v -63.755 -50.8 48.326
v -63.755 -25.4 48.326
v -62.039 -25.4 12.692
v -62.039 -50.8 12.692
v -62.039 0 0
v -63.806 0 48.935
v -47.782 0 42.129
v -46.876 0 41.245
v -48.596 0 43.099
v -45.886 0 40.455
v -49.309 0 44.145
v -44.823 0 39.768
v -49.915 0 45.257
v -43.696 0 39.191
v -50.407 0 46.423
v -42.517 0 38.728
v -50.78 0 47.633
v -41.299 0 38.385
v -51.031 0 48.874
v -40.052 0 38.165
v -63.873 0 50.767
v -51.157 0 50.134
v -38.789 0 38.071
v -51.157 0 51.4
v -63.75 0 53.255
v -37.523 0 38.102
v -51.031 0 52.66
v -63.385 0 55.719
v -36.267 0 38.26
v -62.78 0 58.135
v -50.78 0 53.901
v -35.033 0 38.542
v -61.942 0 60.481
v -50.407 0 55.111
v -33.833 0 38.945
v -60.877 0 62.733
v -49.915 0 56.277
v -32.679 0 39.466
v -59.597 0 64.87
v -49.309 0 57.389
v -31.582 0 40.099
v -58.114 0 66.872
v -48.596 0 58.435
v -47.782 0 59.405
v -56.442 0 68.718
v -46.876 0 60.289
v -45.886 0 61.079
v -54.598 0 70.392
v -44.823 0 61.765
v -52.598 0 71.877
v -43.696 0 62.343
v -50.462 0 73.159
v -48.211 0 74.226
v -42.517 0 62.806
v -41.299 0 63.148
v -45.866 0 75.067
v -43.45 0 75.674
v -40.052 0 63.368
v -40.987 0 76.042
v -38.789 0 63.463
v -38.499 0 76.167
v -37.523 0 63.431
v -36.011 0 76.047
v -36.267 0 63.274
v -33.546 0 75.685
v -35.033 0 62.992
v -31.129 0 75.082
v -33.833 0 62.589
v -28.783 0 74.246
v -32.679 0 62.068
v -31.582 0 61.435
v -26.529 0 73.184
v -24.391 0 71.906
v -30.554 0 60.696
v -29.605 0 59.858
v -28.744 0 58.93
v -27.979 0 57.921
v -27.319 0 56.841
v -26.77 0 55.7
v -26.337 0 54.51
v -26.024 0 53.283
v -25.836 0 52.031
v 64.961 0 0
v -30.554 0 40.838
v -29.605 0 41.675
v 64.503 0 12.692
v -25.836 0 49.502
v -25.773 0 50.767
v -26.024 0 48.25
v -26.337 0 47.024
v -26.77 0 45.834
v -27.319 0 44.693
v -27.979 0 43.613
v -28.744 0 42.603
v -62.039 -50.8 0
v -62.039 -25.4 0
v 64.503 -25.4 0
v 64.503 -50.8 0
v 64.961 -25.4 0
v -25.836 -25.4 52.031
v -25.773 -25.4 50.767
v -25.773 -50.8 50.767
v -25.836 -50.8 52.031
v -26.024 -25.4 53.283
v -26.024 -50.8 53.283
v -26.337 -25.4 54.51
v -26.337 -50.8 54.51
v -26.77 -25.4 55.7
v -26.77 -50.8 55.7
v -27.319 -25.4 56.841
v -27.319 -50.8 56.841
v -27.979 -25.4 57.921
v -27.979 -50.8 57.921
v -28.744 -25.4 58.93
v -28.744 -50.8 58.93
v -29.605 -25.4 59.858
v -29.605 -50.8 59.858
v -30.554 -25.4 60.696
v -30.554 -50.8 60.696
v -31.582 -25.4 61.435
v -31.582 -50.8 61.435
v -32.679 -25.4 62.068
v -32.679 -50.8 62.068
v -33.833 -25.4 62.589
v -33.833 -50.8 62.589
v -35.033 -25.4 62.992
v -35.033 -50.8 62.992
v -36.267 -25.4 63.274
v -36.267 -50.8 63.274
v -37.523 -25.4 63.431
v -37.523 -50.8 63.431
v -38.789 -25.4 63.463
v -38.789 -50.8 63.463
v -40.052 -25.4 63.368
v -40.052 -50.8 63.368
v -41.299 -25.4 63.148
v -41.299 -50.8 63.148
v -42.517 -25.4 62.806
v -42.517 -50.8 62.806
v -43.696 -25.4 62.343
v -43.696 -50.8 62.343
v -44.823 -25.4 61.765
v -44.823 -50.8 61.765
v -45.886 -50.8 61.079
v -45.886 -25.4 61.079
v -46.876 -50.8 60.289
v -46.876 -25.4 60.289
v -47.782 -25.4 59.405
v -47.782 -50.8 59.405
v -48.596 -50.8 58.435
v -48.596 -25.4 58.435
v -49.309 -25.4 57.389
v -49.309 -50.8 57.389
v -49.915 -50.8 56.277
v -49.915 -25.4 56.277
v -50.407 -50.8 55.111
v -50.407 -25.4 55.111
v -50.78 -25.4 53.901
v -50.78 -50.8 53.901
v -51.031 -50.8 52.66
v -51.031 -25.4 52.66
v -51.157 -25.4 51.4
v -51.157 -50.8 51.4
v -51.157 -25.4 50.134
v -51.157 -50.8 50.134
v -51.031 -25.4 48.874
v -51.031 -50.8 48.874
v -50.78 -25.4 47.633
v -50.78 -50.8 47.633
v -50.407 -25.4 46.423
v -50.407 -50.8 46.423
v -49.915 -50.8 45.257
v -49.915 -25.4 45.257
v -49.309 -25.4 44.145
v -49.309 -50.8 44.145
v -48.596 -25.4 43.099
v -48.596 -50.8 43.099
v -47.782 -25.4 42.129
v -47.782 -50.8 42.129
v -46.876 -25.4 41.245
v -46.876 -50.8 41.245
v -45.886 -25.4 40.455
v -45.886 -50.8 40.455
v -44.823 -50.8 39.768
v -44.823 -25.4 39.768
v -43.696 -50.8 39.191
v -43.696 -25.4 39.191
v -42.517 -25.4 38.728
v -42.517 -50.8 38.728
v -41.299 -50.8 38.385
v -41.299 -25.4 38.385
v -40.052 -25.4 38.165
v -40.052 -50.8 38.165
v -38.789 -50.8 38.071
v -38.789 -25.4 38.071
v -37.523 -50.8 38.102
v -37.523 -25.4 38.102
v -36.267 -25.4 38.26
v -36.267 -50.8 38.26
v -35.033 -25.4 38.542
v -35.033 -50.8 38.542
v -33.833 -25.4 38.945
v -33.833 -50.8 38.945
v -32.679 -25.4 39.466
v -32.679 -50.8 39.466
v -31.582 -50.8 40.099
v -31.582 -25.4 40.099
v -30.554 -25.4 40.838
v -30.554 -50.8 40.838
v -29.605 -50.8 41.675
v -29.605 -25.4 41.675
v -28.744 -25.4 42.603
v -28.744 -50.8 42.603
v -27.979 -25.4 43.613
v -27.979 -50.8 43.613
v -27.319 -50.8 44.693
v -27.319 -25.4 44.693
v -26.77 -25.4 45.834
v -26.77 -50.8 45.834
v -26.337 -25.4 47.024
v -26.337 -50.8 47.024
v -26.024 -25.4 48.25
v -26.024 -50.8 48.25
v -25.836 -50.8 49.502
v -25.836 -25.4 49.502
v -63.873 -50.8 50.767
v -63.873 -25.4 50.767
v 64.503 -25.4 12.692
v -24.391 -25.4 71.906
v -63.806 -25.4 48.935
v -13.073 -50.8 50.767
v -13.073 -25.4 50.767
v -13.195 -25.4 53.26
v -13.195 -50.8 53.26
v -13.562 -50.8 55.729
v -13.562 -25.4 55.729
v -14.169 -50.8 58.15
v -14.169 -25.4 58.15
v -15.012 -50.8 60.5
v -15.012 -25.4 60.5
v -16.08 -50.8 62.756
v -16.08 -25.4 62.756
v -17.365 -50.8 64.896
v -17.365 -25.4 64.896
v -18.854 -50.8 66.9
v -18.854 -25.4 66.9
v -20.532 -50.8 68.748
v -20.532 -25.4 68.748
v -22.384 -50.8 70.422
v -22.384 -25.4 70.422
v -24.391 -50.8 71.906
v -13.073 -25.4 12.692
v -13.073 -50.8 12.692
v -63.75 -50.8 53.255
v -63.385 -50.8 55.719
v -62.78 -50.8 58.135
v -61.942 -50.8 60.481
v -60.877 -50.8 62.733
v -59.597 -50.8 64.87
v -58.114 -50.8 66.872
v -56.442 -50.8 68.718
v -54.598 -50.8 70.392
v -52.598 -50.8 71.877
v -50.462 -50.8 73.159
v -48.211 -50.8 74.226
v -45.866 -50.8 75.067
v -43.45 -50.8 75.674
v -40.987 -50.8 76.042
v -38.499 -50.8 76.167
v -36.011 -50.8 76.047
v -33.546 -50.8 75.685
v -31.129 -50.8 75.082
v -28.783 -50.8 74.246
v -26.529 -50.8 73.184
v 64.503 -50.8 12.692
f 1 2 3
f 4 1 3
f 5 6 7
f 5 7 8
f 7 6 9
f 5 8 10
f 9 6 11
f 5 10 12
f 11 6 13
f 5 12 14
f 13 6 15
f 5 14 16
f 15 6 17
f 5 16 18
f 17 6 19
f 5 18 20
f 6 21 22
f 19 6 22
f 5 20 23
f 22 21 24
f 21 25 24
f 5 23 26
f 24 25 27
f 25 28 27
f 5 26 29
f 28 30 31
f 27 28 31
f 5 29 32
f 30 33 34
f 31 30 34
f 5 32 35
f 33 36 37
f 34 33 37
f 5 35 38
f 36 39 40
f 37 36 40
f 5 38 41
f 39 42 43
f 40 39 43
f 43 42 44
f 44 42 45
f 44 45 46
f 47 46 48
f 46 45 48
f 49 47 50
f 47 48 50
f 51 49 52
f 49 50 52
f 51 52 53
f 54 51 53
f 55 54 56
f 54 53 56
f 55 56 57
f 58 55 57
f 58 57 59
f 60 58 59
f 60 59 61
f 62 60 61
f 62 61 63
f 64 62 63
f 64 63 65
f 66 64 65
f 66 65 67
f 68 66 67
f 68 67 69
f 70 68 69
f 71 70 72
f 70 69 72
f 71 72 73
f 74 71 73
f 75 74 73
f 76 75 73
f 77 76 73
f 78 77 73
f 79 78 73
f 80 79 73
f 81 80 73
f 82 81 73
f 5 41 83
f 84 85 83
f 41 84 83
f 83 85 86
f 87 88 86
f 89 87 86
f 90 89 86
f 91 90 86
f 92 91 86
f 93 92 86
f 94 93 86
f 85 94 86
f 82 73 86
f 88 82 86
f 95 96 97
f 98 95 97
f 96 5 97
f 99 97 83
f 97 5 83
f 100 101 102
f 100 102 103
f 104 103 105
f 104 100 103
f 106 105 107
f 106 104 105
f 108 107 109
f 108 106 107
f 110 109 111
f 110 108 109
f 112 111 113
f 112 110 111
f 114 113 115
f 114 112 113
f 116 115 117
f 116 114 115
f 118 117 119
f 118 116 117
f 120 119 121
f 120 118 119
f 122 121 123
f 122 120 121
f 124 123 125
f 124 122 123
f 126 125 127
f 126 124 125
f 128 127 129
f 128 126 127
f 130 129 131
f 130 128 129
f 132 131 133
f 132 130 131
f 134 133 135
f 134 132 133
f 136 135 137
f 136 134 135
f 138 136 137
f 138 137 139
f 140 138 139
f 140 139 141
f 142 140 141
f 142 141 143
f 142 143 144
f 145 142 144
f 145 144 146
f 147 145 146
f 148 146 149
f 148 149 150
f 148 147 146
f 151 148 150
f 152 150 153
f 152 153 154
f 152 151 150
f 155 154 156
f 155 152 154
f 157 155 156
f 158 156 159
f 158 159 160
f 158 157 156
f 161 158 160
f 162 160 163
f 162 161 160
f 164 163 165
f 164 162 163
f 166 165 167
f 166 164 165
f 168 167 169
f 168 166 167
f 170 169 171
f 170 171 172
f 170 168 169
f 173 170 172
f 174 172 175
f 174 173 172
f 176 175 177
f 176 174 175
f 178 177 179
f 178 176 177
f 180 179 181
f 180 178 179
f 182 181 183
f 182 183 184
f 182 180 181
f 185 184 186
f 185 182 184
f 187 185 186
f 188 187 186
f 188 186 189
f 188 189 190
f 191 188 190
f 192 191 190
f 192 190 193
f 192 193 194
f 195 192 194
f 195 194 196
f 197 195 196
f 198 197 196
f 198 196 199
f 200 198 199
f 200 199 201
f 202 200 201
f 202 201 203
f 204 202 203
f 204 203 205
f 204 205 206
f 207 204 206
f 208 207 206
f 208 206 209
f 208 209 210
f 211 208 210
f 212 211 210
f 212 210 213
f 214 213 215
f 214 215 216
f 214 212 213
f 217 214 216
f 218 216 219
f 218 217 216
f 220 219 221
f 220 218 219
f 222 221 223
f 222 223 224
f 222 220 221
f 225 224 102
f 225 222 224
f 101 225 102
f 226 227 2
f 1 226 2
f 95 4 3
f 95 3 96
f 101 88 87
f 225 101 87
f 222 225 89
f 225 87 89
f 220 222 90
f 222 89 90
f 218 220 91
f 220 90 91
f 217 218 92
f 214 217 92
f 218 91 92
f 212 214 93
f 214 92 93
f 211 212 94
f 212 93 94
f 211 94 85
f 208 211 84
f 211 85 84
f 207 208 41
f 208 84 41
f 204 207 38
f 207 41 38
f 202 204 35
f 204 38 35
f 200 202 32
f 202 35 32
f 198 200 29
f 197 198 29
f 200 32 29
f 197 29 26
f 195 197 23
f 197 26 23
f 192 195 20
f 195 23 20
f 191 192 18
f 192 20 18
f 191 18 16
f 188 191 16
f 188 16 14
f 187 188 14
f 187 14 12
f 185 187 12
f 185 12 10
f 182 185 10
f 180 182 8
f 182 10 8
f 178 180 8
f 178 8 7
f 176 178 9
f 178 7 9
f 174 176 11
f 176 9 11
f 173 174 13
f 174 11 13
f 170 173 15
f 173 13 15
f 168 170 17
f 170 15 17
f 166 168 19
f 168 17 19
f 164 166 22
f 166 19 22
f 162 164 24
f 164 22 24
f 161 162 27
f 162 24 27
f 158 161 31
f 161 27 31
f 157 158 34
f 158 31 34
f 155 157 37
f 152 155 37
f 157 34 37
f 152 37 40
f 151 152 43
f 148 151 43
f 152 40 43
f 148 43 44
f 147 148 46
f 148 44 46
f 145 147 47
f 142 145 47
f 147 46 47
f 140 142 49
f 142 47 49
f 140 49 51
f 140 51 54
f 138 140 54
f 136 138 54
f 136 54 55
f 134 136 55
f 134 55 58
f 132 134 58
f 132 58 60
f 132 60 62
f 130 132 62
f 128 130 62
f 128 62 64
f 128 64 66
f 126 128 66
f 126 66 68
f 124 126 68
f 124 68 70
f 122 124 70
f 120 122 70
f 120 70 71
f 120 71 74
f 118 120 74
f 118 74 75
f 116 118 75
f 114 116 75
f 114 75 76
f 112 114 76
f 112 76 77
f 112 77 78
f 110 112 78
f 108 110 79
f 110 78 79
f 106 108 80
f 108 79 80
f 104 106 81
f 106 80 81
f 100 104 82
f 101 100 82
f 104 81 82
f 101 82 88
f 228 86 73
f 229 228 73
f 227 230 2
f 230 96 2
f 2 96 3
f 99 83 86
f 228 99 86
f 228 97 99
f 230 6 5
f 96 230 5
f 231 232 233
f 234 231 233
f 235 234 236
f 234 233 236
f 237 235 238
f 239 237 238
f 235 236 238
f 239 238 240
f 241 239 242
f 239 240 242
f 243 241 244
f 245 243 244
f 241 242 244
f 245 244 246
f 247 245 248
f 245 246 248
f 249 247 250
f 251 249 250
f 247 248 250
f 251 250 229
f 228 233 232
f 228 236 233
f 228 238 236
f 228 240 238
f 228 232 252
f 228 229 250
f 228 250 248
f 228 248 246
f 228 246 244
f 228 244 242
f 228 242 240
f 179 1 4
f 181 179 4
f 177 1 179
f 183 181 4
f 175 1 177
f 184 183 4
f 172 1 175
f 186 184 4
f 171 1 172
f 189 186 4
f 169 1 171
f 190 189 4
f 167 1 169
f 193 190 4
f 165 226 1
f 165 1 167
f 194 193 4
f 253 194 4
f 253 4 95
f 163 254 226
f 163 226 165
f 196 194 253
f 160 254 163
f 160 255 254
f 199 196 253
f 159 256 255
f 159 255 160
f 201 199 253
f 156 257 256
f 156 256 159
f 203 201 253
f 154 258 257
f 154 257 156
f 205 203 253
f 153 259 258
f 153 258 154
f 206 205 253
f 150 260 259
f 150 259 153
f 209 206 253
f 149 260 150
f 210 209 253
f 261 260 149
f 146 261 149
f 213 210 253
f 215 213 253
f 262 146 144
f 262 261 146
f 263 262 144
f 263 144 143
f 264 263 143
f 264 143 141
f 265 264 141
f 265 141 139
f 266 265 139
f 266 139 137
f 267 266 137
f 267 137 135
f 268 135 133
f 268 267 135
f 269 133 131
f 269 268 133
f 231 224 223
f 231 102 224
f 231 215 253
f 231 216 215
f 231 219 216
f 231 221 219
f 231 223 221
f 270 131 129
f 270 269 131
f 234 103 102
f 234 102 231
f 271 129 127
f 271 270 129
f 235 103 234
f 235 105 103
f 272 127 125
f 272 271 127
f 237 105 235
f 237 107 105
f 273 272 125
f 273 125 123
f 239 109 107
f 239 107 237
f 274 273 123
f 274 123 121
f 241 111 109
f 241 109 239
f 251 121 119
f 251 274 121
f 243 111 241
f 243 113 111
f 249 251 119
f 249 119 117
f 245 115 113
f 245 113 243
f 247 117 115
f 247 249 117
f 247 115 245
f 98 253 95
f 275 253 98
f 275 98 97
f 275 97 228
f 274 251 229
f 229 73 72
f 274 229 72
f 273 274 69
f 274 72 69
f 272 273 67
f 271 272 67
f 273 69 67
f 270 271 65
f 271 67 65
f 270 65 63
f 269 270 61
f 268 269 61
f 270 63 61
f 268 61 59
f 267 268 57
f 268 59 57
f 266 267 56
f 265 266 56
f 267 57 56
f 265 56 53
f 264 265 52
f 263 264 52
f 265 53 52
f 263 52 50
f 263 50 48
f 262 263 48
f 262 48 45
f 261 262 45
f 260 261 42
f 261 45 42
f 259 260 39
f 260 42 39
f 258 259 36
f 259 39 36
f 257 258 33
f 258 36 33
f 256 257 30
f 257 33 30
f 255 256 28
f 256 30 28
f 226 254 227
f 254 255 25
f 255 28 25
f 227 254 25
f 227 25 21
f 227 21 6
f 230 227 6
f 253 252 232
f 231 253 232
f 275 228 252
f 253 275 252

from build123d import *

# Parameters (mm, degrees)
F1_DEPTH = 25.4
F2_R     = 12.7
F3_DEPTH = 25.4


with BuildPart() as f1:
    # F0 (on Front) → F1 (new body)
    with BuildSketch(Plane.XZ):
        with BuildLine():
            ThreePointArc((-24.391064, 71.906237), (-50.461929, 73.159197), (-63.872557, 50.7669))
            Line((-63.872557, 50.7669), (-63.806378, 48.934551))
            ThreePointArc((-63.806378, 48.934551), (-37.555786, 25.38345), (-13.072557, 50.7669))
            ThreePointArc((-13.072557, 50.7669), (-16.08026, 62.756272), (-24.391064, 71.906237))
        make_face()
        with BuildLine():
            ThreePointArc((-51.172557, 50.7669), (-38.472557, 63.4669), (-25.772557, 50.7669))
            ThreePointArc((-25.772557, 50.7669), (-38.472557, 38.0669), (-51.172557, 50.7669))
        make_face(mode=Mode.SUBTRACT)
        with BuildLine():
            Line((64.5026, 12.691725), (-24.391064, 71.906237))
            ThreePointArc((-24.391064, 71.906237), (-16.08026, 62.756272), (-13.072557, 50.7669))
            ThreePointArc((-13.072557, 50.7669), (-37.555786, 25.38345), (-63.806378, 48.934551))
            Line((-63.806378, 48.934551), (-62.039014, 0))
            Line((-62.039014, 0), (64.960986, 0))
            Line((64.960986, 0), (64.5026, 12.691725))
        make_face()
    extrude(amount=F1_DEPTH)

    # F2 (on face) → F3 (join)
    with BuildSketch(Plane.XZ.offset(25.4)):
        with BuildLine():
            Line((-13.072557, 12.691725), (-13.072557, 50.7669))
            ThreePointArc((-13.072557, 50.7669), (-16.08026, 62.756272), (-24.391064, 71.906237))
            ThreePointArc((-24.391064, 71.906237), (-50.461929, 73.159197), (-63.872557, 50.7669))
            Line((-63.872557, 50.7669), (-63.755025, 48.326241))
            Line((-63.755025, 48.326241), (-62.039014, 12.691725))
            Line((-62.039014, 12.691725), (-62.039014, 0))
            Line((-62.039014, 0), (64.5026, 0))
            Line((64.5026, 0), (64.5026, 12.691725))
            Line((64.5026, 12.691725), (-13.072557, 12.691725))
        make_face()
        with Locations((-38.472557, 50.7669)):
            Circle(F2_R, mode=Mode.SUBTRACT)
    extrude(amount=F3_DEPTH)


solid = f1.part
